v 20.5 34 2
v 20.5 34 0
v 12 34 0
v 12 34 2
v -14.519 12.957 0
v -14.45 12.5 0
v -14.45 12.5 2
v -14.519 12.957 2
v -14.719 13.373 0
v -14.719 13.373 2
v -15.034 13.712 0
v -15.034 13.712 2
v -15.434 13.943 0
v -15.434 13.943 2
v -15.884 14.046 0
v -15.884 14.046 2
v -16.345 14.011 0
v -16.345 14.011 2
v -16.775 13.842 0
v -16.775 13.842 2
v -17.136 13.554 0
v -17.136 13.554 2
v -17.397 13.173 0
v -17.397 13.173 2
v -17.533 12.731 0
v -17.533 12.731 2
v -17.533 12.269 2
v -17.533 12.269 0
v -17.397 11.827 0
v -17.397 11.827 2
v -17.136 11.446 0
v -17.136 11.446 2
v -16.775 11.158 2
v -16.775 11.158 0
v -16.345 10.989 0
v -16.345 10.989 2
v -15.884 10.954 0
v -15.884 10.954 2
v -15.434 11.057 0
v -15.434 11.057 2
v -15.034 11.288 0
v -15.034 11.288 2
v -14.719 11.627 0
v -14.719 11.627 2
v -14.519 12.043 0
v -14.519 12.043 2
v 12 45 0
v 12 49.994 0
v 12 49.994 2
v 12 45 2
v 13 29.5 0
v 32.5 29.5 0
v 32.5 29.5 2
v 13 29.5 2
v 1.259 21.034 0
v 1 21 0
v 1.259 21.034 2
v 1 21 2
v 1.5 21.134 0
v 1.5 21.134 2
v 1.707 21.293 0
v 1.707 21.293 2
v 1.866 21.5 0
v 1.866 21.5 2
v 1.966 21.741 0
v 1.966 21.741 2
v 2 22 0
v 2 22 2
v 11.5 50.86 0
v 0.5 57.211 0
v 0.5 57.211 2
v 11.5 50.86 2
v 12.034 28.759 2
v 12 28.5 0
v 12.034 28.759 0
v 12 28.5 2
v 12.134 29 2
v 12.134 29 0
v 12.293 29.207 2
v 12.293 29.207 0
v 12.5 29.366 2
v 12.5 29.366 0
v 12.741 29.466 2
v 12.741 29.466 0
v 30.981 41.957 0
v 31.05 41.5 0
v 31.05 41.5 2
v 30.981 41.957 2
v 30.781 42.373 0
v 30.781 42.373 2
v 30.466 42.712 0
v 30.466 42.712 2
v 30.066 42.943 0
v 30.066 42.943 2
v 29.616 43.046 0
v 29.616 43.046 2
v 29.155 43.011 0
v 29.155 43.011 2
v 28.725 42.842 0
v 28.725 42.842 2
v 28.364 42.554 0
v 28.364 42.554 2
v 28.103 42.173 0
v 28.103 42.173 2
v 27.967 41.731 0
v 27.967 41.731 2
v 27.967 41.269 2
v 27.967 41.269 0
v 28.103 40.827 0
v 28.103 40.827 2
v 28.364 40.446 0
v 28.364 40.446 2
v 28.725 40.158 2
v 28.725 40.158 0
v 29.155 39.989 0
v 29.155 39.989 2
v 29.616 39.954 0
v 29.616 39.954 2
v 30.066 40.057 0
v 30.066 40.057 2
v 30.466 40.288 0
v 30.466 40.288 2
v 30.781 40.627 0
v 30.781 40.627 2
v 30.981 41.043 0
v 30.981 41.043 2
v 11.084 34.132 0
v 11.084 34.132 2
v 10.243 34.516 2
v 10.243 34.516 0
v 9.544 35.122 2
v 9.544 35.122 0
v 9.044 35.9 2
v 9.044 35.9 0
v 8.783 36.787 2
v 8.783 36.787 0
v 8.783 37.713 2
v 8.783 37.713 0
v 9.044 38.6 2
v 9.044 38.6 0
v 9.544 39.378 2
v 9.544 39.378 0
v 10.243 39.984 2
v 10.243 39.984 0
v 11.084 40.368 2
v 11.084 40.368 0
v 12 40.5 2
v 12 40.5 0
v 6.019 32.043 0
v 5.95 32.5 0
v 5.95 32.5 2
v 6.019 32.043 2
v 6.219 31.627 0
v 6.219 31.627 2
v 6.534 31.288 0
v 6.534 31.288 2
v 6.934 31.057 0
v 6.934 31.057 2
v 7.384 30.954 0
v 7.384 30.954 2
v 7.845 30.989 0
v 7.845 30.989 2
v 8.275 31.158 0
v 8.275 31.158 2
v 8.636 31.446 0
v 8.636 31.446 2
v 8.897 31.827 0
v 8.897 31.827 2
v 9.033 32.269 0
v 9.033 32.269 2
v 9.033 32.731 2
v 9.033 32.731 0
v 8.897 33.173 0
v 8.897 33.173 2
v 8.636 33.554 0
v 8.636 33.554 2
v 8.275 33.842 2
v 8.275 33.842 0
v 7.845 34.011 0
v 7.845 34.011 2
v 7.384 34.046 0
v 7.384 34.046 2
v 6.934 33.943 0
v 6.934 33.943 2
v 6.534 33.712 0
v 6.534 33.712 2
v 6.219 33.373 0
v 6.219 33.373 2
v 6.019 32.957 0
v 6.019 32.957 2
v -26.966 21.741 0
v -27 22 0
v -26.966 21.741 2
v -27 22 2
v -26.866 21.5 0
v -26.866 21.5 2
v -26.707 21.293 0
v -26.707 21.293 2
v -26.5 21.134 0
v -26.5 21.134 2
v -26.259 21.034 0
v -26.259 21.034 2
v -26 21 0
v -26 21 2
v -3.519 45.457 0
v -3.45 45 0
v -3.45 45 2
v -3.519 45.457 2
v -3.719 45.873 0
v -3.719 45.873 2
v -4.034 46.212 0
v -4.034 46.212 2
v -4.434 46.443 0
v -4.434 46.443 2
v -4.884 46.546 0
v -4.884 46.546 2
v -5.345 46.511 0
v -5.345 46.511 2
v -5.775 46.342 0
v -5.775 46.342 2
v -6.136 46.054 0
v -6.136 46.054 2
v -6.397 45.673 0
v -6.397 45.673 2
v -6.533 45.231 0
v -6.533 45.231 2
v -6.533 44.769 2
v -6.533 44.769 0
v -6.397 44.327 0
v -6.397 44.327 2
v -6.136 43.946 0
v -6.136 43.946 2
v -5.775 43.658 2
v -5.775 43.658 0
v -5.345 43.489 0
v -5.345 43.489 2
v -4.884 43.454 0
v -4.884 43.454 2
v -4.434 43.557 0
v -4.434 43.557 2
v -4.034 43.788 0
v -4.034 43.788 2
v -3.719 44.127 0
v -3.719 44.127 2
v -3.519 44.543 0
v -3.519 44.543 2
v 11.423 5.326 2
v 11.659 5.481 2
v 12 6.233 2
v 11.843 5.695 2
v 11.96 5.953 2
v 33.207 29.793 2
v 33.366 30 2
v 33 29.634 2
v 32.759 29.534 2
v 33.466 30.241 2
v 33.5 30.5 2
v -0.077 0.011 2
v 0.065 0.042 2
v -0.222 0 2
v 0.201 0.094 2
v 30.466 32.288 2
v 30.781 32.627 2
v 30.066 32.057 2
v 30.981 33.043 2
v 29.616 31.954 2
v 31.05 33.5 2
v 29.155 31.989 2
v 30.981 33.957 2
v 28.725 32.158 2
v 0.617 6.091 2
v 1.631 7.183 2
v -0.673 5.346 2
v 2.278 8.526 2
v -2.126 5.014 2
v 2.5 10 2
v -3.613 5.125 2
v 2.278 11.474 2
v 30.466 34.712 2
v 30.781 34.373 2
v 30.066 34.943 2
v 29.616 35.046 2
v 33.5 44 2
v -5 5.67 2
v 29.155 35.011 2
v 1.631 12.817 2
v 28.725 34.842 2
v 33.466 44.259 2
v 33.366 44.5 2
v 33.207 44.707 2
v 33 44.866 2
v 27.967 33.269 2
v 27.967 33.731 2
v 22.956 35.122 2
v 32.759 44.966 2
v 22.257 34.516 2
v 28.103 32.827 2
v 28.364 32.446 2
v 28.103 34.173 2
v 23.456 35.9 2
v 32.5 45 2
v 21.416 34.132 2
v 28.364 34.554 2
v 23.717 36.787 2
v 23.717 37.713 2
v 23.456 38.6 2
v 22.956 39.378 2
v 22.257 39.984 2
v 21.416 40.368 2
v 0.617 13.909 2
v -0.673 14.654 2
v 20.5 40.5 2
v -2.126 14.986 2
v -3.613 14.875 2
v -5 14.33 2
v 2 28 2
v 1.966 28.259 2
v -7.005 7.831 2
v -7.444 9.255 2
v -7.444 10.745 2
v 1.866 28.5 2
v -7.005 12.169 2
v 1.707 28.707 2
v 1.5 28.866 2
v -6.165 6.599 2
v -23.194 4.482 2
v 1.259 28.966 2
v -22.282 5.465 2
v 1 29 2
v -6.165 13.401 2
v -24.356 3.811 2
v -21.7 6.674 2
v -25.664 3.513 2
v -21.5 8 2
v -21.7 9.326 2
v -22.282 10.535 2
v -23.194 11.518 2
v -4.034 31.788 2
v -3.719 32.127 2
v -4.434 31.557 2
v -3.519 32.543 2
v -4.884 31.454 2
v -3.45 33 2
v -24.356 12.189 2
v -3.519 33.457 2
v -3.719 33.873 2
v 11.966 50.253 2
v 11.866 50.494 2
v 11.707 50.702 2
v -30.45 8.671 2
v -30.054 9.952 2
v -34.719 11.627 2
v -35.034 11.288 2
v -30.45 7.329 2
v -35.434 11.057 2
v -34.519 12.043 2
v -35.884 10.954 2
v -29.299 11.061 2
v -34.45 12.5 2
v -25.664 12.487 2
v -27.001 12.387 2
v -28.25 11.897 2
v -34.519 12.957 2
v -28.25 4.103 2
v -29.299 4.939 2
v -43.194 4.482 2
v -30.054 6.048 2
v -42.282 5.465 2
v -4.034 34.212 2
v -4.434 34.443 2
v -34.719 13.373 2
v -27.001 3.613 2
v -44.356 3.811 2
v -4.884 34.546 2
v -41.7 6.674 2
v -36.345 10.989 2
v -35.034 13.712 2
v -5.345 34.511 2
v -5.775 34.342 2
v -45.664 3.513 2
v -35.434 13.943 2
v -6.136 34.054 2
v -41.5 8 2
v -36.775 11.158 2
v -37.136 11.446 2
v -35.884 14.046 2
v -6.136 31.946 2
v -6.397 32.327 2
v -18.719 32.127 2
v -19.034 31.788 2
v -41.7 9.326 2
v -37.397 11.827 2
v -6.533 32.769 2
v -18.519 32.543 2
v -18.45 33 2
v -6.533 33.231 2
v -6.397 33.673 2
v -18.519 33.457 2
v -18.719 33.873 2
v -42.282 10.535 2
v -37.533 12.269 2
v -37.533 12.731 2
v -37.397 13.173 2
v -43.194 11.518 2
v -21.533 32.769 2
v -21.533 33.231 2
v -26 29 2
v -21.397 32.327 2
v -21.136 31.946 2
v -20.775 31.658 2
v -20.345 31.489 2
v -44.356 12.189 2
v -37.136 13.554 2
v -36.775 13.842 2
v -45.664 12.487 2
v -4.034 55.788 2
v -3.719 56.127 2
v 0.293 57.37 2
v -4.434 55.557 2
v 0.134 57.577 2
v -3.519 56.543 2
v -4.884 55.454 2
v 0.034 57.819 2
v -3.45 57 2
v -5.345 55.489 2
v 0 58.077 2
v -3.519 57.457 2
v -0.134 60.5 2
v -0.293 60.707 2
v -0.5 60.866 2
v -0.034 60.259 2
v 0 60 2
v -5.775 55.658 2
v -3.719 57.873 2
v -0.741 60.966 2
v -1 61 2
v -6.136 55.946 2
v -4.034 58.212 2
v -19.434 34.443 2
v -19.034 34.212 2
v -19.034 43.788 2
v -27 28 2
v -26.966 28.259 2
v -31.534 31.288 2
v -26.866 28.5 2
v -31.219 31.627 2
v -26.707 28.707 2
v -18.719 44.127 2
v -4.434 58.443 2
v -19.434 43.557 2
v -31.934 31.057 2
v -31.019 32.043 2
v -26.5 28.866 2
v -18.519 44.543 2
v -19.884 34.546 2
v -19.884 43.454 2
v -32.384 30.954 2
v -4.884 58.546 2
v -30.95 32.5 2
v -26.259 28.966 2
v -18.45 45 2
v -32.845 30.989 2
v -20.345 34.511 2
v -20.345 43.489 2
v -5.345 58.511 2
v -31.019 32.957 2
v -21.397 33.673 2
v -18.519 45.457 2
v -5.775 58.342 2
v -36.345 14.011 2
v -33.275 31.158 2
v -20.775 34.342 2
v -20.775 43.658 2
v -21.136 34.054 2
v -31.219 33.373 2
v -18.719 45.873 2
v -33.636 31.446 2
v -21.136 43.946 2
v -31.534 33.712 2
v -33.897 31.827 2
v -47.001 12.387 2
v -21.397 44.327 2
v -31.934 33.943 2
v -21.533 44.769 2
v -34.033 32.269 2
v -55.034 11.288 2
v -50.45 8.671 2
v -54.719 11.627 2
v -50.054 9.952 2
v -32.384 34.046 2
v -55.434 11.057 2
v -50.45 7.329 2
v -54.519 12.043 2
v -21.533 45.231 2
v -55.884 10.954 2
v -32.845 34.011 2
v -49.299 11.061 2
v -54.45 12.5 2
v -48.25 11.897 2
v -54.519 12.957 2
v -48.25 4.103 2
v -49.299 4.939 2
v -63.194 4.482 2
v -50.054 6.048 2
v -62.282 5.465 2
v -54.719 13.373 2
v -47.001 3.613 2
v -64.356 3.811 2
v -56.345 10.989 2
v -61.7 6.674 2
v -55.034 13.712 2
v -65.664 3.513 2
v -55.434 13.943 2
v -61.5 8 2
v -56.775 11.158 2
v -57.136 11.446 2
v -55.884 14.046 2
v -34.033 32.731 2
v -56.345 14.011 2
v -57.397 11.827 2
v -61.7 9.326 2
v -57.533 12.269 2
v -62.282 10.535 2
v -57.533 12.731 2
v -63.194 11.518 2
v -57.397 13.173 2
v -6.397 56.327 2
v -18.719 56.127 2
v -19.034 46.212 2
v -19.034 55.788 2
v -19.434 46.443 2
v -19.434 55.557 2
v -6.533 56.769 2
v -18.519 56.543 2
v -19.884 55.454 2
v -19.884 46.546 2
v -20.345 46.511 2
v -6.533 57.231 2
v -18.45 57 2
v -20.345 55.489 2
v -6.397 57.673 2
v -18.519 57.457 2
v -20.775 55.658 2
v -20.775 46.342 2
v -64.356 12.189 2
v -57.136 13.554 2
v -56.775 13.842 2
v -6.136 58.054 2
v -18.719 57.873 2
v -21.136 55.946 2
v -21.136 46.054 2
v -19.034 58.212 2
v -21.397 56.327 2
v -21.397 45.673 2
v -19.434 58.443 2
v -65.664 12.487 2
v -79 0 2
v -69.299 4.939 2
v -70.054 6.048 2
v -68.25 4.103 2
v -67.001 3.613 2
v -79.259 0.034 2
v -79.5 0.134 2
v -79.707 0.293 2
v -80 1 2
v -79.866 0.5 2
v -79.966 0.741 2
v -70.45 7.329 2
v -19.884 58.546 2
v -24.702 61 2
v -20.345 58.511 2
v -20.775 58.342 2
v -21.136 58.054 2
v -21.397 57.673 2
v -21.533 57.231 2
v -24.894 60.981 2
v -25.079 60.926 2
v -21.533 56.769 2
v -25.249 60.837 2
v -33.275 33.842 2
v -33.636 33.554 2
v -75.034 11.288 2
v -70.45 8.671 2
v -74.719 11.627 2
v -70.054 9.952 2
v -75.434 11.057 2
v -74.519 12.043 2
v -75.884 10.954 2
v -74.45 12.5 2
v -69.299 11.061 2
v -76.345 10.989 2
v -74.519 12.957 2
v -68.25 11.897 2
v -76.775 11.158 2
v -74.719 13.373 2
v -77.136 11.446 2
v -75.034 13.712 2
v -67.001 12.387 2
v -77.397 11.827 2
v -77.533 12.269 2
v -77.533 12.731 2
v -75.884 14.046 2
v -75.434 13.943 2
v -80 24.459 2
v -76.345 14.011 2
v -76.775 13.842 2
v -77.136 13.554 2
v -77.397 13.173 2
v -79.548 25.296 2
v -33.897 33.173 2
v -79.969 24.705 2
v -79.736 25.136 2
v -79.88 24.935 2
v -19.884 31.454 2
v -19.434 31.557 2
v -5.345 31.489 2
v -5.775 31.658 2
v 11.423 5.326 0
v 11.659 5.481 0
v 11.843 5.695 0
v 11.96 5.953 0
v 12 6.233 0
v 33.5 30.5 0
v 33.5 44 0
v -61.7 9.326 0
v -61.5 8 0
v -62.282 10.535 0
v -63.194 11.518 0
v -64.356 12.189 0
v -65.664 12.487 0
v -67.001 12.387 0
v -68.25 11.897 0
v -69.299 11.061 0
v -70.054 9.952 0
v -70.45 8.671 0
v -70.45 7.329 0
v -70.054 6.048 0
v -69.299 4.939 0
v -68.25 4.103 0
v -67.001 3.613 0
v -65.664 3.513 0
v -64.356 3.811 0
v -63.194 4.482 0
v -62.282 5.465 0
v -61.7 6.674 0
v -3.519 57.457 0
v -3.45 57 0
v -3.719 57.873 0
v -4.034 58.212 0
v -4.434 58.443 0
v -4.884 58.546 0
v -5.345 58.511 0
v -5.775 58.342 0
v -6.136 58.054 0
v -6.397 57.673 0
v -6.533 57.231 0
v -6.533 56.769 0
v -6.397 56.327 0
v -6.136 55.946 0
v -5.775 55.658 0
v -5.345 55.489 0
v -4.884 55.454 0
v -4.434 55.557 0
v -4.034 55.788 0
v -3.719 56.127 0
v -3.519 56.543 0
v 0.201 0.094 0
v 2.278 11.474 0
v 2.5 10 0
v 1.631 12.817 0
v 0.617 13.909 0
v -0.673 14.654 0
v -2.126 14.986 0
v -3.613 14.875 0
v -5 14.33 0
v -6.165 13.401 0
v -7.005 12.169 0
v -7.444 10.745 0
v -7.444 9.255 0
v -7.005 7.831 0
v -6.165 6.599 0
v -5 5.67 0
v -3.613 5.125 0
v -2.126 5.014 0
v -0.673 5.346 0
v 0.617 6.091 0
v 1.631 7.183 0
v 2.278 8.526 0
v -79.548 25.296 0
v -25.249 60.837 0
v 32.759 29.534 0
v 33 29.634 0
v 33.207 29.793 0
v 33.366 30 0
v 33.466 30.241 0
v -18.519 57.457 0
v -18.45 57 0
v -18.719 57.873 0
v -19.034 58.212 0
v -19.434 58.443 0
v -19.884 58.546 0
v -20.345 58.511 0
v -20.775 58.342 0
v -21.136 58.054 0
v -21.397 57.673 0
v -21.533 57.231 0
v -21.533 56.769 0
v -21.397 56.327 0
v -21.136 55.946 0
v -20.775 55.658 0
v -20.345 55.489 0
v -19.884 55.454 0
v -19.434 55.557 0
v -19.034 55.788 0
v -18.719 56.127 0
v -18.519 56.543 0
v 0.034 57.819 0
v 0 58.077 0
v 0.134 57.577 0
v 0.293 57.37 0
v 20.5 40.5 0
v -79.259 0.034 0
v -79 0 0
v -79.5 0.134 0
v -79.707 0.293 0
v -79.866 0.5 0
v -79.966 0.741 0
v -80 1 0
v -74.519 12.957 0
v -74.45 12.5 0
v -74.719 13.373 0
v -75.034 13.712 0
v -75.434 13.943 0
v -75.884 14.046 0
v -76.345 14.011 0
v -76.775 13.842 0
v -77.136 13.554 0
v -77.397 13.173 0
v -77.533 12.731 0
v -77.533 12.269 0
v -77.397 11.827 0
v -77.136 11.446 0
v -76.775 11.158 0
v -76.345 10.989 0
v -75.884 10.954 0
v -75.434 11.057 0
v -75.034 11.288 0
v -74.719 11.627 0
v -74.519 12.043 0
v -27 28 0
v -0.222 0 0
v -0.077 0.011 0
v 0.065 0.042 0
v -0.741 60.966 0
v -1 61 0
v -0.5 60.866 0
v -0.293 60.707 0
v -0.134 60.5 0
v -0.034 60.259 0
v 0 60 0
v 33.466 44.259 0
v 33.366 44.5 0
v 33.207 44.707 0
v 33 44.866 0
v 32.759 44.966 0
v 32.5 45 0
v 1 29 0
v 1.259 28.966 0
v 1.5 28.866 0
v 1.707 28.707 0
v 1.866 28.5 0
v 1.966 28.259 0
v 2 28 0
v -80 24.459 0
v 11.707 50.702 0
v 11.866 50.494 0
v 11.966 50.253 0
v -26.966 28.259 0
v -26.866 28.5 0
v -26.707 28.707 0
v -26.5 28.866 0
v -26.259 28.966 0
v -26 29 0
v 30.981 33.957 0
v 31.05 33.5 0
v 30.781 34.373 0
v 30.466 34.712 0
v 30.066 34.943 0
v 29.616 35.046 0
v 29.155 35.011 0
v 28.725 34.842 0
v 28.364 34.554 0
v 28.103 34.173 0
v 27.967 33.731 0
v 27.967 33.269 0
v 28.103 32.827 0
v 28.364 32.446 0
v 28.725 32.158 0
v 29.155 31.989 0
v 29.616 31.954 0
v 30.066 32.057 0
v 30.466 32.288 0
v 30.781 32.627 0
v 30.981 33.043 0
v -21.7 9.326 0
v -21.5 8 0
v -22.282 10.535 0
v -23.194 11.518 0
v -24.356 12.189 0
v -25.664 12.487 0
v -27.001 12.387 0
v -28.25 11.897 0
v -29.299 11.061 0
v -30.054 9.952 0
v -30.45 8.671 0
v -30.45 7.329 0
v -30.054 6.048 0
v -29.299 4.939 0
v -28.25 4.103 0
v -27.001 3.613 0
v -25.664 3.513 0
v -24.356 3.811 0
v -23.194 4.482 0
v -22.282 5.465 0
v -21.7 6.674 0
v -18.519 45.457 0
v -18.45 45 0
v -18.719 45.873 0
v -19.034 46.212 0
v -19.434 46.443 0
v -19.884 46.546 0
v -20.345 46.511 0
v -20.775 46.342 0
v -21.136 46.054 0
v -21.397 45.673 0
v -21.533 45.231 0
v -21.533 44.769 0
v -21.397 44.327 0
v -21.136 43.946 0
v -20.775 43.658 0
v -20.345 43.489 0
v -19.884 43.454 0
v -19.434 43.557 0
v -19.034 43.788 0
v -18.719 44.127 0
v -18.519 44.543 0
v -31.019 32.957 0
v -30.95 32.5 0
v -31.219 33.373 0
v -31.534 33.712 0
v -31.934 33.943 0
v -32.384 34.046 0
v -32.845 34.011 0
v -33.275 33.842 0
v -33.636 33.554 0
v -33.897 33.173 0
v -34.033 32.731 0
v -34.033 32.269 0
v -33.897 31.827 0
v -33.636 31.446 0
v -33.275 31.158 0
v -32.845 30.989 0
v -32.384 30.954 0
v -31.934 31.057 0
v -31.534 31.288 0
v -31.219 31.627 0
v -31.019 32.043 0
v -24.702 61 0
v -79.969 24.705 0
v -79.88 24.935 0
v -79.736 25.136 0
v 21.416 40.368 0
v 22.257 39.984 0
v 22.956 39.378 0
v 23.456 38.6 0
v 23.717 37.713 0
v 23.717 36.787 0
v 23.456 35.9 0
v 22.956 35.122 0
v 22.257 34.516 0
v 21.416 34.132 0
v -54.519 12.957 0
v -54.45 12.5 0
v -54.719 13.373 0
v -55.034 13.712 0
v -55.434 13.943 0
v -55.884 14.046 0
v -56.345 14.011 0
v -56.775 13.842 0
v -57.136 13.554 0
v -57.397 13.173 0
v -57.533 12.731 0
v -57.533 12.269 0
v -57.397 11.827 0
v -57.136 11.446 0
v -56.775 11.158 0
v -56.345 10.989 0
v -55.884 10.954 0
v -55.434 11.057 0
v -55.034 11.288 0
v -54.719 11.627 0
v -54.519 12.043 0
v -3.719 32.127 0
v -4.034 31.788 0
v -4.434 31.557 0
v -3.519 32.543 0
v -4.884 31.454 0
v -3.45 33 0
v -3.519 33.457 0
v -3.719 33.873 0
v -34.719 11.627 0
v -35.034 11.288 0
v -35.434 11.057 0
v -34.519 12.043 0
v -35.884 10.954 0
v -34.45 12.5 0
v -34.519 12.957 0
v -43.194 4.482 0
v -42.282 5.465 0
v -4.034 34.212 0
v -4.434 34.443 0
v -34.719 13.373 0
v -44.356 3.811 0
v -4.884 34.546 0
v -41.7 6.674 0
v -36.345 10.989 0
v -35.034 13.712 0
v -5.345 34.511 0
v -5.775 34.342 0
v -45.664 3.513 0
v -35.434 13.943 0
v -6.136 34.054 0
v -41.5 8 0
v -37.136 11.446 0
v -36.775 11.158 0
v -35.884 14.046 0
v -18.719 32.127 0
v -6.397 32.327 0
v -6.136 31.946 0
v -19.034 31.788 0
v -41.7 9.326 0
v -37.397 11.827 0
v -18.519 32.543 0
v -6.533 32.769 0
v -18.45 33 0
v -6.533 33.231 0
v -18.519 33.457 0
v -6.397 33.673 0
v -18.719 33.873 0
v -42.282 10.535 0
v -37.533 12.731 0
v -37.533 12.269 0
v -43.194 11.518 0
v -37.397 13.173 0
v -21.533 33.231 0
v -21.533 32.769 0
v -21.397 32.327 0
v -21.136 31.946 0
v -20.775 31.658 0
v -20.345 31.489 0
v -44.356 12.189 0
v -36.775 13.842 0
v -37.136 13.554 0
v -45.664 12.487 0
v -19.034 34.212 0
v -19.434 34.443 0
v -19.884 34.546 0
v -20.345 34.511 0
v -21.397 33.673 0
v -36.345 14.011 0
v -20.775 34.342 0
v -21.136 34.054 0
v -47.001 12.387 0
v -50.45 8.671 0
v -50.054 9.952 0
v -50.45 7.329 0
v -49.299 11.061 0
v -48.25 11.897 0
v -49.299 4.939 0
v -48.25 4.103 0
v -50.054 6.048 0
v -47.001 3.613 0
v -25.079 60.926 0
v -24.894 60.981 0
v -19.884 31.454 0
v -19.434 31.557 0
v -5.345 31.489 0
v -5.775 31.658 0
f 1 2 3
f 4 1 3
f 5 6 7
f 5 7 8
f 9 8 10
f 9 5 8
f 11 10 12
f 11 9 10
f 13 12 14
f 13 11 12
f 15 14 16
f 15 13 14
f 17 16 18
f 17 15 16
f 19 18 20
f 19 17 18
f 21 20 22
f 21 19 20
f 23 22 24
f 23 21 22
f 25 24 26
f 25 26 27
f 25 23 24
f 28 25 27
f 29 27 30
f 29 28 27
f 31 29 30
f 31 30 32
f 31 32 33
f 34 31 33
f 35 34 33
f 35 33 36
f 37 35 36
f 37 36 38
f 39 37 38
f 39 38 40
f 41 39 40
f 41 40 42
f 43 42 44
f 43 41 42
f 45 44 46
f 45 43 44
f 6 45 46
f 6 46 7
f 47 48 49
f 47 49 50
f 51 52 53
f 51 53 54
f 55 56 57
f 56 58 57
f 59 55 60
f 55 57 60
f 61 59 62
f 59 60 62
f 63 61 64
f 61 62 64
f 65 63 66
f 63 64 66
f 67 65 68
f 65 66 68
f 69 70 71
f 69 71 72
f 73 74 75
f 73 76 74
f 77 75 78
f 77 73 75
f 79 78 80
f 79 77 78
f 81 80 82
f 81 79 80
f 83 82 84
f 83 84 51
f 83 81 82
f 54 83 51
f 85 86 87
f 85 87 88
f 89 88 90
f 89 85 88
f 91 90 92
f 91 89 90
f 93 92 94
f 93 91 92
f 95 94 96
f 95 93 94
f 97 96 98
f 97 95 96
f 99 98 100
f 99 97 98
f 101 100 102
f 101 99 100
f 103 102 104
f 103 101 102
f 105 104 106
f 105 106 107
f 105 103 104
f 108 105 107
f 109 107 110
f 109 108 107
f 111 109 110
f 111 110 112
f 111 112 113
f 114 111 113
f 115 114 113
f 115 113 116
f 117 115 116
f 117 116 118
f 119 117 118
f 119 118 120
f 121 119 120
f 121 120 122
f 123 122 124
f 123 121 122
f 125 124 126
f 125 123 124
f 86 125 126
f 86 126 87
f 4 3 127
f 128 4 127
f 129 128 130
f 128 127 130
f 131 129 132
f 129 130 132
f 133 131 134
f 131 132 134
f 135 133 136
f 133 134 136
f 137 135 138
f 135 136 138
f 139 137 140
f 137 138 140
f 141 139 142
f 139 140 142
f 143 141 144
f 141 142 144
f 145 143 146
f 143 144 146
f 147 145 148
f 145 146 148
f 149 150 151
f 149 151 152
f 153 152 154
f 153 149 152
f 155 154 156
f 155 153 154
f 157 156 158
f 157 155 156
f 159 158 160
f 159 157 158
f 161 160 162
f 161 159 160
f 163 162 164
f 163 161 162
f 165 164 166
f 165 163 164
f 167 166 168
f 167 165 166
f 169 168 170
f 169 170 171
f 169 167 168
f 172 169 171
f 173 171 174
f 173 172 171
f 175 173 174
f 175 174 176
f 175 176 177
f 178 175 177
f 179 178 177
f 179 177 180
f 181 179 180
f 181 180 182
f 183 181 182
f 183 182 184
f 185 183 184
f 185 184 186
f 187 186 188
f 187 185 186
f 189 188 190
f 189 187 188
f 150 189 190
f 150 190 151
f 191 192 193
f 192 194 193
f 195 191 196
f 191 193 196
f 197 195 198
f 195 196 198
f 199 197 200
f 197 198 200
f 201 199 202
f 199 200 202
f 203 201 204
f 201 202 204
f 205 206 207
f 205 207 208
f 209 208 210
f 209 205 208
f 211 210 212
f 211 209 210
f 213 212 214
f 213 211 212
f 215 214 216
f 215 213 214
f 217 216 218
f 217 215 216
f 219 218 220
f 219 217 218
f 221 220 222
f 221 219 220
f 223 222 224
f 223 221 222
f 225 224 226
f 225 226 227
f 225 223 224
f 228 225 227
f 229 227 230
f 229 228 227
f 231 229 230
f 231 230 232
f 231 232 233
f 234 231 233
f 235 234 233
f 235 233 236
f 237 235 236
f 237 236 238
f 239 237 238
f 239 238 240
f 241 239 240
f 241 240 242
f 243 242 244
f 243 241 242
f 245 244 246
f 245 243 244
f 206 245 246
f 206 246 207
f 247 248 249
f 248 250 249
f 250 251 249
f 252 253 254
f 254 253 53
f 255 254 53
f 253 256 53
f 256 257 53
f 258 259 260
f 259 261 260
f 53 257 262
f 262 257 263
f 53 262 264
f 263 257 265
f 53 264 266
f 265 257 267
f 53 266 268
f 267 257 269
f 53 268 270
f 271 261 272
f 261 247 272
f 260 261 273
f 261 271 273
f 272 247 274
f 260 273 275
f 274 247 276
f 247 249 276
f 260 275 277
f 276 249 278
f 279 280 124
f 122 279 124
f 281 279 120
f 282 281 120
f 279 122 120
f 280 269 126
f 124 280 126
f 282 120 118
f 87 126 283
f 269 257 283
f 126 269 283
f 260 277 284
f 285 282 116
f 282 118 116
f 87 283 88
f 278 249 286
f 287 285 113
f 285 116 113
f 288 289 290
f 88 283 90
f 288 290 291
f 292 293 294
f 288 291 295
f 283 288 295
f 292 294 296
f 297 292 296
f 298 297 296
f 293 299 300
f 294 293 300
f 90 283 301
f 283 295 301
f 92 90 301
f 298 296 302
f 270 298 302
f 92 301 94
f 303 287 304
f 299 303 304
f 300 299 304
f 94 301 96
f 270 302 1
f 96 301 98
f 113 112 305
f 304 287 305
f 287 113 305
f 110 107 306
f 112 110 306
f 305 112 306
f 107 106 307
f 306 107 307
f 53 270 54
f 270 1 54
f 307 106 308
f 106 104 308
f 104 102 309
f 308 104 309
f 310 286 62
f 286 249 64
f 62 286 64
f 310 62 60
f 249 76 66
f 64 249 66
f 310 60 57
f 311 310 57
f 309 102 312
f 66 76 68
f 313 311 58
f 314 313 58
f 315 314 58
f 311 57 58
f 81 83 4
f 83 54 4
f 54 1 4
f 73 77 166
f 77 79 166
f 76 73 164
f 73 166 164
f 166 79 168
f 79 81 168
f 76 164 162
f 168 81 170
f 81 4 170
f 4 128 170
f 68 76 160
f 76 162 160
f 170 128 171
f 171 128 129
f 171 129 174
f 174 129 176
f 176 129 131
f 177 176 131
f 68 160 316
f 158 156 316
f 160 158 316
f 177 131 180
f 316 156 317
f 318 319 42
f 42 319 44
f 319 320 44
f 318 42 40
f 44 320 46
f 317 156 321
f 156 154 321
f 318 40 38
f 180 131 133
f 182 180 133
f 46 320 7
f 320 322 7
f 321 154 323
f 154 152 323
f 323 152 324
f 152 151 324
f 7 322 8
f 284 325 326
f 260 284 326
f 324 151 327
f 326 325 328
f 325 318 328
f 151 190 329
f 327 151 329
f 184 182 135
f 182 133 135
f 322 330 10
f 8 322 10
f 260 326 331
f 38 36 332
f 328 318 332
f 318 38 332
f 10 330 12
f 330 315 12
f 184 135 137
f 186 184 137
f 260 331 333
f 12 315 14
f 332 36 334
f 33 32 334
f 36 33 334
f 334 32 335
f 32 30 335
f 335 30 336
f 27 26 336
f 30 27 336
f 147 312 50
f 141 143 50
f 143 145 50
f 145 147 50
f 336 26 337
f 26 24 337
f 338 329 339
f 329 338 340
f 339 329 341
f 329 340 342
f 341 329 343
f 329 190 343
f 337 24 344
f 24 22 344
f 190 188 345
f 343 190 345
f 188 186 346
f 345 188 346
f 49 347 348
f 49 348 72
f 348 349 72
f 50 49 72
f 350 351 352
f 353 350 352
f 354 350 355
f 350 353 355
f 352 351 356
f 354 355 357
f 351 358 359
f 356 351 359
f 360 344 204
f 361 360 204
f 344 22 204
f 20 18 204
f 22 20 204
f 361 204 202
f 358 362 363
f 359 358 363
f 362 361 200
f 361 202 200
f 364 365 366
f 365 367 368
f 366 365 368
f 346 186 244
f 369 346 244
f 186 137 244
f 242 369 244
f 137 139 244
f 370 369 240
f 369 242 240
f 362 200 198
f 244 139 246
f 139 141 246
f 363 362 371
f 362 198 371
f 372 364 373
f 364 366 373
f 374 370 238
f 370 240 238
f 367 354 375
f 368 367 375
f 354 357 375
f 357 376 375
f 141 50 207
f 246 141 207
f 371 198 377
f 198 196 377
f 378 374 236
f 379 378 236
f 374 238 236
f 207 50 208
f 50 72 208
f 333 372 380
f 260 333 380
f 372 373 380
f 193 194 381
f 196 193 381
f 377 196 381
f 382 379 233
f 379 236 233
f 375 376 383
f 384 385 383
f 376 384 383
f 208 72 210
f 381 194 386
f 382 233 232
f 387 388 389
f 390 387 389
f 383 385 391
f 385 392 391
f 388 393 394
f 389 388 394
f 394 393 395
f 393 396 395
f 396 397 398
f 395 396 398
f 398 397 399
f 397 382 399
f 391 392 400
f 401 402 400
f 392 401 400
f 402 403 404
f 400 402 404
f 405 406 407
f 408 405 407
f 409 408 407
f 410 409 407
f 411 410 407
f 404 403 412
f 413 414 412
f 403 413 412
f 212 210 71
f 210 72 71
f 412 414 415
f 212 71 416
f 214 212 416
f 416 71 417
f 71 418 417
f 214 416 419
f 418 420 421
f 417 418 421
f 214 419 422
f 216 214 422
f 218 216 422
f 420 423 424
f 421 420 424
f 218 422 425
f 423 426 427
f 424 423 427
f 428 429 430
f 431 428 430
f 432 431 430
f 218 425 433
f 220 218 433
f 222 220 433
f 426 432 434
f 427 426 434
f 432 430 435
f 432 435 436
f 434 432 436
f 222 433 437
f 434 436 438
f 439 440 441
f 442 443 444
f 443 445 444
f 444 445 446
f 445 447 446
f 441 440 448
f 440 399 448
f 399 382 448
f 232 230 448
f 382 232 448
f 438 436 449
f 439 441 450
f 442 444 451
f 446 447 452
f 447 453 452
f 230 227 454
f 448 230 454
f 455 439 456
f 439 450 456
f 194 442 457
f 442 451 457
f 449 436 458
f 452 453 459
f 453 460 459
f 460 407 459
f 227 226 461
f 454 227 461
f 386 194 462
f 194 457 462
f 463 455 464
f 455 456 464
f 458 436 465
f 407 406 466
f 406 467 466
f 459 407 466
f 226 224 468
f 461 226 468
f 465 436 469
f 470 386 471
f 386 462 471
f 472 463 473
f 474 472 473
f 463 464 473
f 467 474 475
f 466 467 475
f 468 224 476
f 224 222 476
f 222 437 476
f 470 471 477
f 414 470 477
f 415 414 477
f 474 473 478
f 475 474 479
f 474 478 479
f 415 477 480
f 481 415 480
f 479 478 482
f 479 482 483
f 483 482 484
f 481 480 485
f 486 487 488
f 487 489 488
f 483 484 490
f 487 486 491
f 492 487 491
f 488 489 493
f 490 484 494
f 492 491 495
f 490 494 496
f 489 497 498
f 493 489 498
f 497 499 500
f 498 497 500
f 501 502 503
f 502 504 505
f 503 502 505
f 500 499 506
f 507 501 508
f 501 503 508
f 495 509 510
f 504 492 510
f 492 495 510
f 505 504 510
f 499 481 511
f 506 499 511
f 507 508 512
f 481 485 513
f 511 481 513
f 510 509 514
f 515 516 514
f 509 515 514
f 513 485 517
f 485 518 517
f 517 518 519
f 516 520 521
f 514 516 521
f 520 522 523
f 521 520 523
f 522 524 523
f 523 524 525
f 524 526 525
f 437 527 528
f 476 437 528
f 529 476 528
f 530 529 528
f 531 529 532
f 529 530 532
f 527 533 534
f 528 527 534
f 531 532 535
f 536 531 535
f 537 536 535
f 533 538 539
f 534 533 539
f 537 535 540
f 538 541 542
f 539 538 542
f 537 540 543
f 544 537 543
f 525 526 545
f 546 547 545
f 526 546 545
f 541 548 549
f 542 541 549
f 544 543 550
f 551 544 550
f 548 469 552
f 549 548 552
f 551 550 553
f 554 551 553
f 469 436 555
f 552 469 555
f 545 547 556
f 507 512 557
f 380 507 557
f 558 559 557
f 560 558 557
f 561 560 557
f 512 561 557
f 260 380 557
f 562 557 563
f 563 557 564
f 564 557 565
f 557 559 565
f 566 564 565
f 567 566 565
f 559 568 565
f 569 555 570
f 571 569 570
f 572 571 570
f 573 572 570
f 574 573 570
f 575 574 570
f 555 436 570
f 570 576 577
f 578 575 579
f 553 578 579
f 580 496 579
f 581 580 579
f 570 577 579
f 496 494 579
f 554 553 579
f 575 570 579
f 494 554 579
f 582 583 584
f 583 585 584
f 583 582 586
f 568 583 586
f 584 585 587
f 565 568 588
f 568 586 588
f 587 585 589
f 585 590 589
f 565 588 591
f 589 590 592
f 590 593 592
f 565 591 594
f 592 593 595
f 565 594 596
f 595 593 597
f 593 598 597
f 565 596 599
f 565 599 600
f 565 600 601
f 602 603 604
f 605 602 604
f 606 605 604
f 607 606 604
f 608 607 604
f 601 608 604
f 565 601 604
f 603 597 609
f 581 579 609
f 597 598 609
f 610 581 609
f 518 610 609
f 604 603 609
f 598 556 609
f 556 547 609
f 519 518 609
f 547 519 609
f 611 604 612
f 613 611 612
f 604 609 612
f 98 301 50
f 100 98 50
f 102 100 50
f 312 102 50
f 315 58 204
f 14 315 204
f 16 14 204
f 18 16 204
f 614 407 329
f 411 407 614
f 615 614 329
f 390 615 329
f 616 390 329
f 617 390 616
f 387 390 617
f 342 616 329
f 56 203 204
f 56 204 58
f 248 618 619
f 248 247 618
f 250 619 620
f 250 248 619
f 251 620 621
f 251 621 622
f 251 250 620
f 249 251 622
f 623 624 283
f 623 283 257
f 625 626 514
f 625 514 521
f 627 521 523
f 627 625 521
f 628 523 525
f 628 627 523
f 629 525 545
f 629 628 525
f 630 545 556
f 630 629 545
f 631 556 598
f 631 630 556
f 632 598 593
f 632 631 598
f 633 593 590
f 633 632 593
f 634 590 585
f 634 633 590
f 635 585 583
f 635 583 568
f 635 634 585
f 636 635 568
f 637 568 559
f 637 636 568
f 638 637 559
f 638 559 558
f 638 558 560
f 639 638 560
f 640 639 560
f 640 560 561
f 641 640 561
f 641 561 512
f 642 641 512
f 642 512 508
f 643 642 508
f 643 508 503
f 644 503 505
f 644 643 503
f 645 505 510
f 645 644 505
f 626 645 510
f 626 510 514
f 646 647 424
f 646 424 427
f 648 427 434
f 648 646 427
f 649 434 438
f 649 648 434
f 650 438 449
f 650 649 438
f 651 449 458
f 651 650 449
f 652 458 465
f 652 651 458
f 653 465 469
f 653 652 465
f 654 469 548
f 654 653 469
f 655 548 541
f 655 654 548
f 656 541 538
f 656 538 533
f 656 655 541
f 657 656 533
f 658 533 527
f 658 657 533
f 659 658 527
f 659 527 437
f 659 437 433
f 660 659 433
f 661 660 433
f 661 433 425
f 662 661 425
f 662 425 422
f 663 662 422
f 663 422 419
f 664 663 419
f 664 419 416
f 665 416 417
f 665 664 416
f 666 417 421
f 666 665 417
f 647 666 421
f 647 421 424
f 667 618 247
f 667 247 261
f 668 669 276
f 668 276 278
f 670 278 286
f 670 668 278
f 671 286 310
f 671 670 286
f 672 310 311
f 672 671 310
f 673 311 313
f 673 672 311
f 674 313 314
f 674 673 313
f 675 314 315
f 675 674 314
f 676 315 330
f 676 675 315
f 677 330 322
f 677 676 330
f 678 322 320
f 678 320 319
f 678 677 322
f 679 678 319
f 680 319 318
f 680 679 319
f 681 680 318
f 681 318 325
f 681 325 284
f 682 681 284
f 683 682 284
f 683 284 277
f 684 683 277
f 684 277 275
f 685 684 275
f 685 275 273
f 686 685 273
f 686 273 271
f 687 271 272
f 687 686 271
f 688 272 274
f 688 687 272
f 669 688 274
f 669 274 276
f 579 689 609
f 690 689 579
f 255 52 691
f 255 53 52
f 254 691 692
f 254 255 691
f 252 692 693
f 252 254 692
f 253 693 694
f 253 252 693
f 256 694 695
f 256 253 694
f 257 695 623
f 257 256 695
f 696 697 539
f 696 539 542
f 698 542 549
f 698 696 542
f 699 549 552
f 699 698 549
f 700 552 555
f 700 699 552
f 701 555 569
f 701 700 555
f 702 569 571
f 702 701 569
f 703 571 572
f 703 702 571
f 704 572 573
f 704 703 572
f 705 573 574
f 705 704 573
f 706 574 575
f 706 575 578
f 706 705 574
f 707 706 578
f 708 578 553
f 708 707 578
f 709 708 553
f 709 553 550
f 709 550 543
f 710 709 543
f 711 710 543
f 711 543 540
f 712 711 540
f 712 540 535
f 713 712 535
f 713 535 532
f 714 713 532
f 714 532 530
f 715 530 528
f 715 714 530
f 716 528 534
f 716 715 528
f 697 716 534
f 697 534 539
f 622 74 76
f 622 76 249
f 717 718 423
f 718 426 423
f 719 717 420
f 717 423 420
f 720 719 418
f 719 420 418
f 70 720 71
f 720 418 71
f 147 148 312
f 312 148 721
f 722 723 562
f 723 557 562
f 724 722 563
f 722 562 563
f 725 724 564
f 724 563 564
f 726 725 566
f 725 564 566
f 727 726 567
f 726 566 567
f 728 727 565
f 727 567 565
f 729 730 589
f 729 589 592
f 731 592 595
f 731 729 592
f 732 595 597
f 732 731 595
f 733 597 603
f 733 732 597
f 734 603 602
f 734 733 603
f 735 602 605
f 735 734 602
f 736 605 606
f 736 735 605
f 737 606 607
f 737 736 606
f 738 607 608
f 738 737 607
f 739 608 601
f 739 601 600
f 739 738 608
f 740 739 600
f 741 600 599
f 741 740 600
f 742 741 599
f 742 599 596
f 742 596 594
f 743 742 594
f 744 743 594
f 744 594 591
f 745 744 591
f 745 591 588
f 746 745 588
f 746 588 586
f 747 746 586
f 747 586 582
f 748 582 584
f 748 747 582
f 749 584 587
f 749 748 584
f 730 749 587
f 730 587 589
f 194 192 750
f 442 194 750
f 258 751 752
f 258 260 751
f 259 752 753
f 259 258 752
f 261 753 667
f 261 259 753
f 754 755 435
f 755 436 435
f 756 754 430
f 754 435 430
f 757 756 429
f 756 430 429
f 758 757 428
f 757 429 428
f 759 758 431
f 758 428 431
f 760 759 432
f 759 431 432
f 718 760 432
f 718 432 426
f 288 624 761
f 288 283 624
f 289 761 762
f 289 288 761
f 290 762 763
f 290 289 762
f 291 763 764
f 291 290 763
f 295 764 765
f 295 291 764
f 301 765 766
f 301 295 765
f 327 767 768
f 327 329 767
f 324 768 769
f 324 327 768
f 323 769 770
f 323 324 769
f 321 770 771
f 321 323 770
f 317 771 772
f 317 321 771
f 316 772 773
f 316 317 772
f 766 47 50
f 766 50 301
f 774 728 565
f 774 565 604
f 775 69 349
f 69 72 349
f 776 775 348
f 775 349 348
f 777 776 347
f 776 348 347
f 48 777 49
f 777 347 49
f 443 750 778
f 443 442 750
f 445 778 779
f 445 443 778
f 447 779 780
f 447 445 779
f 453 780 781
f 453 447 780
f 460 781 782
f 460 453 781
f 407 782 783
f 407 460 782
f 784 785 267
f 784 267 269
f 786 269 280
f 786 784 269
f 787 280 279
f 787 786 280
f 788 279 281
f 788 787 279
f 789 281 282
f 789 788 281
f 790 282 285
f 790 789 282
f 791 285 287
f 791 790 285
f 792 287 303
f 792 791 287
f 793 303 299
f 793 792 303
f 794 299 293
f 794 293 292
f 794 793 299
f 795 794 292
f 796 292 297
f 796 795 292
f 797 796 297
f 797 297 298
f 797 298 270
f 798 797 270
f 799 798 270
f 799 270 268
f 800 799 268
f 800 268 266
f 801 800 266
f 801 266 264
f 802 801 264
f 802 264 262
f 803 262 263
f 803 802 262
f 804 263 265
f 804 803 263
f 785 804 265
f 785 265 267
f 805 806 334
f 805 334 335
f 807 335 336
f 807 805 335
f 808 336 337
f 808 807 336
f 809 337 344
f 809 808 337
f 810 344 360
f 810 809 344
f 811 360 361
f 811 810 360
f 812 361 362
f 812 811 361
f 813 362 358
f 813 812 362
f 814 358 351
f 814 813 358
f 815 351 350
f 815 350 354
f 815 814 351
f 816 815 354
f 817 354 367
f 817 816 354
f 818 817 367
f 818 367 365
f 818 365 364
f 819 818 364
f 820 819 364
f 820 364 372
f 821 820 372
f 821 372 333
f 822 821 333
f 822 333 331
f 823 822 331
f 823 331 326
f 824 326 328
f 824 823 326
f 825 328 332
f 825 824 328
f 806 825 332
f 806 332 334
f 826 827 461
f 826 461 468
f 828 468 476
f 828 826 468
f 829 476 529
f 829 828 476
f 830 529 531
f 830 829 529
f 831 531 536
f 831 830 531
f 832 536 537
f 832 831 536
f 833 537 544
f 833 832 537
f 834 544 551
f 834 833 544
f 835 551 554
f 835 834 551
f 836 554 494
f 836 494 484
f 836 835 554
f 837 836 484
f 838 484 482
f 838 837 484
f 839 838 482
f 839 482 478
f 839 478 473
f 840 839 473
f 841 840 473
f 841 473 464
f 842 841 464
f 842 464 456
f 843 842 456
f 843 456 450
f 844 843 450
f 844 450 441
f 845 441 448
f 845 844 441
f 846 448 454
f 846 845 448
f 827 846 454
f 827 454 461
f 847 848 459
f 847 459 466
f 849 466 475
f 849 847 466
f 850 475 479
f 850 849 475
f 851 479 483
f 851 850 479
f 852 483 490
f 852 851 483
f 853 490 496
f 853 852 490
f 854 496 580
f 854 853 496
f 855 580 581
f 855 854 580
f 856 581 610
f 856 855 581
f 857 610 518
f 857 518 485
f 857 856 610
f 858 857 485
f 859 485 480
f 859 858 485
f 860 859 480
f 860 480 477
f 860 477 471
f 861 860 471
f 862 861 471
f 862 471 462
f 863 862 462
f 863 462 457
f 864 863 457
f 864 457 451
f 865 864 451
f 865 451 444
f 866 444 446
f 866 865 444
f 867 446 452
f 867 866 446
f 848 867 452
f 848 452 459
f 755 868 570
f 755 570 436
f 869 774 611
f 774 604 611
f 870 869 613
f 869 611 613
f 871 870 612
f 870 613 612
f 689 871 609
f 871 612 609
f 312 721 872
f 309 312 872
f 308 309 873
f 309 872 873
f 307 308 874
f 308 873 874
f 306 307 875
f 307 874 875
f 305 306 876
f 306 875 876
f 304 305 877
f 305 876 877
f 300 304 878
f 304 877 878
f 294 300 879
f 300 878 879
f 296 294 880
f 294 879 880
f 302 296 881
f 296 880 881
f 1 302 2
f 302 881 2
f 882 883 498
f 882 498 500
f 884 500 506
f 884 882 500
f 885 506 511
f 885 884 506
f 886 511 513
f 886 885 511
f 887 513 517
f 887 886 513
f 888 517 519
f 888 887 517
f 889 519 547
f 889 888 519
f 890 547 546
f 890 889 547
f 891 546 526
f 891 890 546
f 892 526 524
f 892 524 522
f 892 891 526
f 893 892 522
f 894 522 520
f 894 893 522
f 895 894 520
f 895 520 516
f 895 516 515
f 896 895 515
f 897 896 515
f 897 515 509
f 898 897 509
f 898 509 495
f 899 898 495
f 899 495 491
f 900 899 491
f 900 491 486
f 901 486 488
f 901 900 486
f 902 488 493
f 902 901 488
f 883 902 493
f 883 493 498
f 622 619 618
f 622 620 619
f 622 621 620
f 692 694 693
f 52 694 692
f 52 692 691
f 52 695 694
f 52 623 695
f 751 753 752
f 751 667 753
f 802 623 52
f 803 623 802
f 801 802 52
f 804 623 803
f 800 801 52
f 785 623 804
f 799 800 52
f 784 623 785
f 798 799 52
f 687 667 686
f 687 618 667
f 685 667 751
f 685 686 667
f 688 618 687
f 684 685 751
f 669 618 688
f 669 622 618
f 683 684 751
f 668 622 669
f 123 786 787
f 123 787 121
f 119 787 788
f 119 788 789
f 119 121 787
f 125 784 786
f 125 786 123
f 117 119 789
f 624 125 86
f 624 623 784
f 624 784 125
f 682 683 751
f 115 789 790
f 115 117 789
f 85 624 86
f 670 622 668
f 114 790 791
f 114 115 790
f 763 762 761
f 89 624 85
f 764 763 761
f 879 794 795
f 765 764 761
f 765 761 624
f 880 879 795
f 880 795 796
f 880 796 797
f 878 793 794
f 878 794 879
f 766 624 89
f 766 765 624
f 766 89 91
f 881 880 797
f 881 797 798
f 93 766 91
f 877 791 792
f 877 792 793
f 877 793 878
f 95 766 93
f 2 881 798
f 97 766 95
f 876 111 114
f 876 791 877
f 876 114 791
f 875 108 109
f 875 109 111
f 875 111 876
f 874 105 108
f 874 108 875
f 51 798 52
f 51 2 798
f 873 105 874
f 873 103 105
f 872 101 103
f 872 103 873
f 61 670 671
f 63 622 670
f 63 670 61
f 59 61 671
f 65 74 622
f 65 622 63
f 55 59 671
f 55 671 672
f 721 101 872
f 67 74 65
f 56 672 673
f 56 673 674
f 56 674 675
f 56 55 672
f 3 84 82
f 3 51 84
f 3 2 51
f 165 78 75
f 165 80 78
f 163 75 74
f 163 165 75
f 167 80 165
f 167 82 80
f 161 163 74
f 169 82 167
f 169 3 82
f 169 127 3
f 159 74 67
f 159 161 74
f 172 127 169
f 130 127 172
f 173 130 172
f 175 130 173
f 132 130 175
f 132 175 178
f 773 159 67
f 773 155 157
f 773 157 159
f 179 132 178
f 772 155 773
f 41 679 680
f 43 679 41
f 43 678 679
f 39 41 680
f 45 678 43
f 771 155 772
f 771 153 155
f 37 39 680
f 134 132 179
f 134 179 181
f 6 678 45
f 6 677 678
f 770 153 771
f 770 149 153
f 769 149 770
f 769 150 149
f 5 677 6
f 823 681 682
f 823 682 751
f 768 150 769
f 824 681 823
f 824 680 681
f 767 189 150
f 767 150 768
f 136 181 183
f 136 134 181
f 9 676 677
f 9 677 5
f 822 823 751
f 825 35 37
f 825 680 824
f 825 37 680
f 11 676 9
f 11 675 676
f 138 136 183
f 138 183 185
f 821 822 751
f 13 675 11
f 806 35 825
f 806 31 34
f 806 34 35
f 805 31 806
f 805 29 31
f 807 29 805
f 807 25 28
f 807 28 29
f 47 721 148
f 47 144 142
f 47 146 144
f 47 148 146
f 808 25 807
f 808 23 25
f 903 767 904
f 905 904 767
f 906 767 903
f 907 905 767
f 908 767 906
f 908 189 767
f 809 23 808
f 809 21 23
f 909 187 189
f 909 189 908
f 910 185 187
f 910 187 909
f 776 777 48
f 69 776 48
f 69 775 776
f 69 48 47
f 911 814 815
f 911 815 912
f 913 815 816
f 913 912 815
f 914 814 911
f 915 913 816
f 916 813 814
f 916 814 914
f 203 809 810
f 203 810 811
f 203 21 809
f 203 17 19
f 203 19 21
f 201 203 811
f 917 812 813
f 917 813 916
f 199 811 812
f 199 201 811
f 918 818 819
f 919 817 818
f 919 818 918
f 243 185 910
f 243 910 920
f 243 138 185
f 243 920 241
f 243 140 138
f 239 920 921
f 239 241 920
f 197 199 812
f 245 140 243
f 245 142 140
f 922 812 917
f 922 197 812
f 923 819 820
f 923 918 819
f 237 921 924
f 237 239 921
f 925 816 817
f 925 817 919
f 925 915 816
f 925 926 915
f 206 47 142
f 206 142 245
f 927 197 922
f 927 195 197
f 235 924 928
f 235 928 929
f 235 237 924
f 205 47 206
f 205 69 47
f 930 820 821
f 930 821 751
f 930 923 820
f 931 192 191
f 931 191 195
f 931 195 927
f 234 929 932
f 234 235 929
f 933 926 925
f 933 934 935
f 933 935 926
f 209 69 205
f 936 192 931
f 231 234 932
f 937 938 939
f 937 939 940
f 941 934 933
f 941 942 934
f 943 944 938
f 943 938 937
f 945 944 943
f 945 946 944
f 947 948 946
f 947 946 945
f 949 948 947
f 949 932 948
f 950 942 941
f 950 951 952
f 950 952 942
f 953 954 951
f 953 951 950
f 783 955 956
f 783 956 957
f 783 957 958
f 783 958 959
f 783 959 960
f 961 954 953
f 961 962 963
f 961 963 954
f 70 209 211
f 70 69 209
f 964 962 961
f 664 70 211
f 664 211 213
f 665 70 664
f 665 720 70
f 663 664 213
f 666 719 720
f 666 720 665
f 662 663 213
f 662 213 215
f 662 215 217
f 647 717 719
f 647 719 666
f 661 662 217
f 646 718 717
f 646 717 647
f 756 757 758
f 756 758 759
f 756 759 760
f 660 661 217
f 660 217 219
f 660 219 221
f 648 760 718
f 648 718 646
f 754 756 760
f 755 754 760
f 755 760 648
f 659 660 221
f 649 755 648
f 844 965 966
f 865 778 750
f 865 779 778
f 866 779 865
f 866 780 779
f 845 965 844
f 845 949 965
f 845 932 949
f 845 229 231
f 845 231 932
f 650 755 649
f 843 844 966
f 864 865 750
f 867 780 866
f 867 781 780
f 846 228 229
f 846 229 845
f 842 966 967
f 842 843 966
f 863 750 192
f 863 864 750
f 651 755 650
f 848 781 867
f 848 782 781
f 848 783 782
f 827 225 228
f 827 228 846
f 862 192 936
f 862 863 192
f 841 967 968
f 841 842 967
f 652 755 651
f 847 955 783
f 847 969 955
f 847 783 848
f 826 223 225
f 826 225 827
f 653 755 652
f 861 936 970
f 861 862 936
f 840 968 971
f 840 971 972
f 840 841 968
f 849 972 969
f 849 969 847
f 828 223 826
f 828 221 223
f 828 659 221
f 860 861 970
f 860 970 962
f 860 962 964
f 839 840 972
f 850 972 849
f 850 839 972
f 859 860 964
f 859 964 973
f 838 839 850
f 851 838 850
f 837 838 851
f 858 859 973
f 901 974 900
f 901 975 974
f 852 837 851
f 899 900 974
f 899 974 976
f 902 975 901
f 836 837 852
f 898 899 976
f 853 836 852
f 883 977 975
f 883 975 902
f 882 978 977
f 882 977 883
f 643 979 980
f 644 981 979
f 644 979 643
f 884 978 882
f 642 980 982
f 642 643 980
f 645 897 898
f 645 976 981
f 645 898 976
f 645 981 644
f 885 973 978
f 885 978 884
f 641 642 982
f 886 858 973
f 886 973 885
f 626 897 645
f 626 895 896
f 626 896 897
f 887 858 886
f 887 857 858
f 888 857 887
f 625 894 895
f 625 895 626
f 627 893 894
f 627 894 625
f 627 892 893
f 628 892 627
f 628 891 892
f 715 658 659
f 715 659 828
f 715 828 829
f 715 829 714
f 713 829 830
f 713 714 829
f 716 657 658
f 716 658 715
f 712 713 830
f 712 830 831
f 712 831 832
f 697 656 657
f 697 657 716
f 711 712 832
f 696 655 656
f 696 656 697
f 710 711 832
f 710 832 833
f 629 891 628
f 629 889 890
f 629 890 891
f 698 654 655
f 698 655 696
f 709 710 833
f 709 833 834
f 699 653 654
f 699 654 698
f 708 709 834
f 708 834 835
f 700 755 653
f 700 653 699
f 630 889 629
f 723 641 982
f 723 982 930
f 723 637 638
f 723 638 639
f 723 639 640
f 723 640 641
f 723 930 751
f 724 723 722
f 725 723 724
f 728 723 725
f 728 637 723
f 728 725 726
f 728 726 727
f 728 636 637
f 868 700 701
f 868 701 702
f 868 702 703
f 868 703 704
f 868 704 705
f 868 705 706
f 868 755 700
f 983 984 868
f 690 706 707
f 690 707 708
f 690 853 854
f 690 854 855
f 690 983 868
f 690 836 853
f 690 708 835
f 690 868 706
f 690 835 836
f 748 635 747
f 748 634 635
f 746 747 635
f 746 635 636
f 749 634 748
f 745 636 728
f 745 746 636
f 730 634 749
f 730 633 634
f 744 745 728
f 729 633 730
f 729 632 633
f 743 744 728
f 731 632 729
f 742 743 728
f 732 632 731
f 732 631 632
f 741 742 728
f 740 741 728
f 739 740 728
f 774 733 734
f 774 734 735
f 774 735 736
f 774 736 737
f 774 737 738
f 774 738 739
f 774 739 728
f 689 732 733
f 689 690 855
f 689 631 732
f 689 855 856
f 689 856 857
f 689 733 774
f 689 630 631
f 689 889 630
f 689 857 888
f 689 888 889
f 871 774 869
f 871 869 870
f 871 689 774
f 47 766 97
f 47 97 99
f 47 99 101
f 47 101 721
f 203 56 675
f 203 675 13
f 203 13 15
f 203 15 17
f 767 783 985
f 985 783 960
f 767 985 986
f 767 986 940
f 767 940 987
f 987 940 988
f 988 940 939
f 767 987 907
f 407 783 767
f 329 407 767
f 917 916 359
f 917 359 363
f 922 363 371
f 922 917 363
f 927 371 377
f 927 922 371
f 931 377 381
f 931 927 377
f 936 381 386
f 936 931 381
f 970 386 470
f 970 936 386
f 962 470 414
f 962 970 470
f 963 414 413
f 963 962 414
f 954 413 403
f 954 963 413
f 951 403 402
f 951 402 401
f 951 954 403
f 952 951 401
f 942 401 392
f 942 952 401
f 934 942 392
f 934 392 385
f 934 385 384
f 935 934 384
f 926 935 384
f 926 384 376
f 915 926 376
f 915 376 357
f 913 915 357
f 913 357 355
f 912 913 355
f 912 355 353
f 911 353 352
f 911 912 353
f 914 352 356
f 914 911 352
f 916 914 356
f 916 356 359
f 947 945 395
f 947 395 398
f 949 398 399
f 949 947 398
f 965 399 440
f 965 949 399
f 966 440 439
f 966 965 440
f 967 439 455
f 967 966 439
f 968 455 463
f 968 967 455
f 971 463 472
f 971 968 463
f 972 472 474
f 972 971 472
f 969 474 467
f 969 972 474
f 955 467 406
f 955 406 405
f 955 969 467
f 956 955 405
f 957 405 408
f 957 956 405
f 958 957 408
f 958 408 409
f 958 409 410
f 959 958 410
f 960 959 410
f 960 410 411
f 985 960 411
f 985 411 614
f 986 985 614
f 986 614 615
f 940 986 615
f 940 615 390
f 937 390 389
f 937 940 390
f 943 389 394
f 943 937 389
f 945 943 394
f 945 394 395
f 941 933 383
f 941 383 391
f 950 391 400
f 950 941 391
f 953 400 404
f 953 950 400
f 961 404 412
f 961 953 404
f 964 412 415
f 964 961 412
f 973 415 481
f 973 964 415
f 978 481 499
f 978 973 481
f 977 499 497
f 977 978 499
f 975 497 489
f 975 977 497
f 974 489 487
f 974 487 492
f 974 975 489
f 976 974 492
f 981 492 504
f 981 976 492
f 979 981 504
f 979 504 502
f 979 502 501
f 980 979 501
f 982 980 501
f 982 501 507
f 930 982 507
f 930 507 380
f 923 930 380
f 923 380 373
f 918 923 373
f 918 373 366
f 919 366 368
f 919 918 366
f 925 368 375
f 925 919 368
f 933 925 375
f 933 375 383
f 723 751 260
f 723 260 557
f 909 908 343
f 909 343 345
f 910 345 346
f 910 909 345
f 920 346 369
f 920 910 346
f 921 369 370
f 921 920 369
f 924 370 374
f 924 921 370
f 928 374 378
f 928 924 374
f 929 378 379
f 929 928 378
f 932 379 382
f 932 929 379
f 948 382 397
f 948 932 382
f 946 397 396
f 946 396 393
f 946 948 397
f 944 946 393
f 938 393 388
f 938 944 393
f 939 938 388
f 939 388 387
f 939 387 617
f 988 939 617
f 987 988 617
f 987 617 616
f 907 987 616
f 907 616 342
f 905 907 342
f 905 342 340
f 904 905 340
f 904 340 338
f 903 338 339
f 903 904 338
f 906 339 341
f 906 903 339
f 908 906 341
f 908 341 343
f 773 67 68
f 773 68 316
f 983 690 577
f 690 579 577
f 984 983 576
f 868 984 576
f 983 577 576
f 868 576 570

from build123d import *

# Parameters (mm, degrees)
SKETCH_1_R      = 1.55
SKETCH_1_R_2    = 4.5
SKETCH_1_R_3    = 5
SKETCH_1_W      = 29
SKETCH_1_H      = 8
EXTRUDE_1_DEPTH = 2
FILLET_1_R      = 1


with BuildPart() as part:
    # 草图1 → 凸台-拉伸1 (new body)
    with BuildSketch(Plane.XY):
        Polygon((0, 0), (-80, 0), (-80, 25), (-25, 61), (0, 61), (0, 57.5), (12, 50.57179677), (12, 45), (33.5, 45), (33.5, 29.5), (12, 29.5), (12, 5.595691898), align=None)
        with Locations((-36, 12.5)):
            Circle(SKETCH_1_R, mode=Mode.SUBTRACT)
        with Locations((-56, 12.5)):
            Circle(SKETCH_1_R, mode=Mode.SUBTRACT)
        with Locations((-76, 12.5)):
            Circle(SKETCH_1_R, mode=Mode.SUBTRACT)
        with Locations((-16, 12.5)):
            Circle(SKETCH_1_R, mode=Mode.SUBTRACT)
        with Locations((29.5, 41.5)):
            Circle(SKETCH_1_R, mode=Mode.SUBTRACT)
        with Locations((29.5, 33.5)):
            Circle(SKETCH_1_R, mode=Mode.SUBTRACT)
        with Locations((-5, 33)):
            Circle(SKETCH_1_R, mode=Mode.SUBTRACT)
        with Locations((-20, 33)):
            Circle(SKETCH_1_R, mode=Mode.SUBTRACT)
        with Locations((-5, 45)):
            Circle(SKETCH_1_R, mode=Mode.SUBTRACT)
        with Locations((-20, 45)):
            Circle(SKETCH_1_R, mode=Mode.SUBTRACT)
        with Locations((-5, 57)):
            Circle(SKETCH_1_R, mode=Mode.SUBTRACT)
        with Locations((-20, 57)):
            Circle(SKETCH_1_R, mode=Mode.SUBTRACT)
        with Locations((-26, 8)):
            Circle(SKETCH_1_R_2, mode=Mode.SUBTRACT)
        with Locations((-46, 8)):
            Circle(SKETCH_1_R_2, mode=Mode.SUBTRACT)
        with Locations((-66, 8)):
            Circle(SKETCH_1_R_2, mode=Mode.SUBTRACT)
        with Locations((-2.5, 10)):
            Circle(SKETCH_1_R_3, mode=Mode.SUBTRACT)
        with Locations((-32.5, 32.5)):
            Circle(SKETCH_1_R, mode=Mode.SUBTRACT)
        with Locations(Location((7.5, 32.5, 0), (0, 0, 180))):
            Circle(SKETCH_1_R, mode=Mode.SUBTRACT)
        with Locations((-12.5, 25)):
            Rectangle(SKETCH_1_W, SKETCH_1_H, mode=Mode.SUBTRACT)
        with BuildLine():
            Line((20.5, 34), (12, 34))
            ThreePointArc((12, 34), (8.75, 37.25), (12, 40.5))
            Line((12, 40.5), (20.5, 40.5))
            ThreePointArc((20.5, 40.5), (23.75, 37.25), (20.5, 34))
        make_face(mode=Mode.SUBTRACT)
    extrude(amount=EXTRUDE_1_DEPTH)

    # 圆角1
    fillet_1_edges = [part.edges().sort_by_distance(p)[0] for p in [
        (0, 0, 1),
        (-80, 0, 1),
        (-80, 25, 1),
        (-25, 61, 1),
        (0, 61, 1),
        (0, 57.5, 1),
        (12, 50.57179677, 1),
        (33.5, 45, 1),
        (33.5, 29.5, 1),
        (12, 29.5, 1),
        (12, 5.595691898, 1),
        (-27, 29, 1),
        (-27, 21, 1),
        (2, 21, 1),
        (2, 29, 1),
    ]]
    fillet(fillet_1_edges, radius=FILLET_1_R)


solid = part.part
